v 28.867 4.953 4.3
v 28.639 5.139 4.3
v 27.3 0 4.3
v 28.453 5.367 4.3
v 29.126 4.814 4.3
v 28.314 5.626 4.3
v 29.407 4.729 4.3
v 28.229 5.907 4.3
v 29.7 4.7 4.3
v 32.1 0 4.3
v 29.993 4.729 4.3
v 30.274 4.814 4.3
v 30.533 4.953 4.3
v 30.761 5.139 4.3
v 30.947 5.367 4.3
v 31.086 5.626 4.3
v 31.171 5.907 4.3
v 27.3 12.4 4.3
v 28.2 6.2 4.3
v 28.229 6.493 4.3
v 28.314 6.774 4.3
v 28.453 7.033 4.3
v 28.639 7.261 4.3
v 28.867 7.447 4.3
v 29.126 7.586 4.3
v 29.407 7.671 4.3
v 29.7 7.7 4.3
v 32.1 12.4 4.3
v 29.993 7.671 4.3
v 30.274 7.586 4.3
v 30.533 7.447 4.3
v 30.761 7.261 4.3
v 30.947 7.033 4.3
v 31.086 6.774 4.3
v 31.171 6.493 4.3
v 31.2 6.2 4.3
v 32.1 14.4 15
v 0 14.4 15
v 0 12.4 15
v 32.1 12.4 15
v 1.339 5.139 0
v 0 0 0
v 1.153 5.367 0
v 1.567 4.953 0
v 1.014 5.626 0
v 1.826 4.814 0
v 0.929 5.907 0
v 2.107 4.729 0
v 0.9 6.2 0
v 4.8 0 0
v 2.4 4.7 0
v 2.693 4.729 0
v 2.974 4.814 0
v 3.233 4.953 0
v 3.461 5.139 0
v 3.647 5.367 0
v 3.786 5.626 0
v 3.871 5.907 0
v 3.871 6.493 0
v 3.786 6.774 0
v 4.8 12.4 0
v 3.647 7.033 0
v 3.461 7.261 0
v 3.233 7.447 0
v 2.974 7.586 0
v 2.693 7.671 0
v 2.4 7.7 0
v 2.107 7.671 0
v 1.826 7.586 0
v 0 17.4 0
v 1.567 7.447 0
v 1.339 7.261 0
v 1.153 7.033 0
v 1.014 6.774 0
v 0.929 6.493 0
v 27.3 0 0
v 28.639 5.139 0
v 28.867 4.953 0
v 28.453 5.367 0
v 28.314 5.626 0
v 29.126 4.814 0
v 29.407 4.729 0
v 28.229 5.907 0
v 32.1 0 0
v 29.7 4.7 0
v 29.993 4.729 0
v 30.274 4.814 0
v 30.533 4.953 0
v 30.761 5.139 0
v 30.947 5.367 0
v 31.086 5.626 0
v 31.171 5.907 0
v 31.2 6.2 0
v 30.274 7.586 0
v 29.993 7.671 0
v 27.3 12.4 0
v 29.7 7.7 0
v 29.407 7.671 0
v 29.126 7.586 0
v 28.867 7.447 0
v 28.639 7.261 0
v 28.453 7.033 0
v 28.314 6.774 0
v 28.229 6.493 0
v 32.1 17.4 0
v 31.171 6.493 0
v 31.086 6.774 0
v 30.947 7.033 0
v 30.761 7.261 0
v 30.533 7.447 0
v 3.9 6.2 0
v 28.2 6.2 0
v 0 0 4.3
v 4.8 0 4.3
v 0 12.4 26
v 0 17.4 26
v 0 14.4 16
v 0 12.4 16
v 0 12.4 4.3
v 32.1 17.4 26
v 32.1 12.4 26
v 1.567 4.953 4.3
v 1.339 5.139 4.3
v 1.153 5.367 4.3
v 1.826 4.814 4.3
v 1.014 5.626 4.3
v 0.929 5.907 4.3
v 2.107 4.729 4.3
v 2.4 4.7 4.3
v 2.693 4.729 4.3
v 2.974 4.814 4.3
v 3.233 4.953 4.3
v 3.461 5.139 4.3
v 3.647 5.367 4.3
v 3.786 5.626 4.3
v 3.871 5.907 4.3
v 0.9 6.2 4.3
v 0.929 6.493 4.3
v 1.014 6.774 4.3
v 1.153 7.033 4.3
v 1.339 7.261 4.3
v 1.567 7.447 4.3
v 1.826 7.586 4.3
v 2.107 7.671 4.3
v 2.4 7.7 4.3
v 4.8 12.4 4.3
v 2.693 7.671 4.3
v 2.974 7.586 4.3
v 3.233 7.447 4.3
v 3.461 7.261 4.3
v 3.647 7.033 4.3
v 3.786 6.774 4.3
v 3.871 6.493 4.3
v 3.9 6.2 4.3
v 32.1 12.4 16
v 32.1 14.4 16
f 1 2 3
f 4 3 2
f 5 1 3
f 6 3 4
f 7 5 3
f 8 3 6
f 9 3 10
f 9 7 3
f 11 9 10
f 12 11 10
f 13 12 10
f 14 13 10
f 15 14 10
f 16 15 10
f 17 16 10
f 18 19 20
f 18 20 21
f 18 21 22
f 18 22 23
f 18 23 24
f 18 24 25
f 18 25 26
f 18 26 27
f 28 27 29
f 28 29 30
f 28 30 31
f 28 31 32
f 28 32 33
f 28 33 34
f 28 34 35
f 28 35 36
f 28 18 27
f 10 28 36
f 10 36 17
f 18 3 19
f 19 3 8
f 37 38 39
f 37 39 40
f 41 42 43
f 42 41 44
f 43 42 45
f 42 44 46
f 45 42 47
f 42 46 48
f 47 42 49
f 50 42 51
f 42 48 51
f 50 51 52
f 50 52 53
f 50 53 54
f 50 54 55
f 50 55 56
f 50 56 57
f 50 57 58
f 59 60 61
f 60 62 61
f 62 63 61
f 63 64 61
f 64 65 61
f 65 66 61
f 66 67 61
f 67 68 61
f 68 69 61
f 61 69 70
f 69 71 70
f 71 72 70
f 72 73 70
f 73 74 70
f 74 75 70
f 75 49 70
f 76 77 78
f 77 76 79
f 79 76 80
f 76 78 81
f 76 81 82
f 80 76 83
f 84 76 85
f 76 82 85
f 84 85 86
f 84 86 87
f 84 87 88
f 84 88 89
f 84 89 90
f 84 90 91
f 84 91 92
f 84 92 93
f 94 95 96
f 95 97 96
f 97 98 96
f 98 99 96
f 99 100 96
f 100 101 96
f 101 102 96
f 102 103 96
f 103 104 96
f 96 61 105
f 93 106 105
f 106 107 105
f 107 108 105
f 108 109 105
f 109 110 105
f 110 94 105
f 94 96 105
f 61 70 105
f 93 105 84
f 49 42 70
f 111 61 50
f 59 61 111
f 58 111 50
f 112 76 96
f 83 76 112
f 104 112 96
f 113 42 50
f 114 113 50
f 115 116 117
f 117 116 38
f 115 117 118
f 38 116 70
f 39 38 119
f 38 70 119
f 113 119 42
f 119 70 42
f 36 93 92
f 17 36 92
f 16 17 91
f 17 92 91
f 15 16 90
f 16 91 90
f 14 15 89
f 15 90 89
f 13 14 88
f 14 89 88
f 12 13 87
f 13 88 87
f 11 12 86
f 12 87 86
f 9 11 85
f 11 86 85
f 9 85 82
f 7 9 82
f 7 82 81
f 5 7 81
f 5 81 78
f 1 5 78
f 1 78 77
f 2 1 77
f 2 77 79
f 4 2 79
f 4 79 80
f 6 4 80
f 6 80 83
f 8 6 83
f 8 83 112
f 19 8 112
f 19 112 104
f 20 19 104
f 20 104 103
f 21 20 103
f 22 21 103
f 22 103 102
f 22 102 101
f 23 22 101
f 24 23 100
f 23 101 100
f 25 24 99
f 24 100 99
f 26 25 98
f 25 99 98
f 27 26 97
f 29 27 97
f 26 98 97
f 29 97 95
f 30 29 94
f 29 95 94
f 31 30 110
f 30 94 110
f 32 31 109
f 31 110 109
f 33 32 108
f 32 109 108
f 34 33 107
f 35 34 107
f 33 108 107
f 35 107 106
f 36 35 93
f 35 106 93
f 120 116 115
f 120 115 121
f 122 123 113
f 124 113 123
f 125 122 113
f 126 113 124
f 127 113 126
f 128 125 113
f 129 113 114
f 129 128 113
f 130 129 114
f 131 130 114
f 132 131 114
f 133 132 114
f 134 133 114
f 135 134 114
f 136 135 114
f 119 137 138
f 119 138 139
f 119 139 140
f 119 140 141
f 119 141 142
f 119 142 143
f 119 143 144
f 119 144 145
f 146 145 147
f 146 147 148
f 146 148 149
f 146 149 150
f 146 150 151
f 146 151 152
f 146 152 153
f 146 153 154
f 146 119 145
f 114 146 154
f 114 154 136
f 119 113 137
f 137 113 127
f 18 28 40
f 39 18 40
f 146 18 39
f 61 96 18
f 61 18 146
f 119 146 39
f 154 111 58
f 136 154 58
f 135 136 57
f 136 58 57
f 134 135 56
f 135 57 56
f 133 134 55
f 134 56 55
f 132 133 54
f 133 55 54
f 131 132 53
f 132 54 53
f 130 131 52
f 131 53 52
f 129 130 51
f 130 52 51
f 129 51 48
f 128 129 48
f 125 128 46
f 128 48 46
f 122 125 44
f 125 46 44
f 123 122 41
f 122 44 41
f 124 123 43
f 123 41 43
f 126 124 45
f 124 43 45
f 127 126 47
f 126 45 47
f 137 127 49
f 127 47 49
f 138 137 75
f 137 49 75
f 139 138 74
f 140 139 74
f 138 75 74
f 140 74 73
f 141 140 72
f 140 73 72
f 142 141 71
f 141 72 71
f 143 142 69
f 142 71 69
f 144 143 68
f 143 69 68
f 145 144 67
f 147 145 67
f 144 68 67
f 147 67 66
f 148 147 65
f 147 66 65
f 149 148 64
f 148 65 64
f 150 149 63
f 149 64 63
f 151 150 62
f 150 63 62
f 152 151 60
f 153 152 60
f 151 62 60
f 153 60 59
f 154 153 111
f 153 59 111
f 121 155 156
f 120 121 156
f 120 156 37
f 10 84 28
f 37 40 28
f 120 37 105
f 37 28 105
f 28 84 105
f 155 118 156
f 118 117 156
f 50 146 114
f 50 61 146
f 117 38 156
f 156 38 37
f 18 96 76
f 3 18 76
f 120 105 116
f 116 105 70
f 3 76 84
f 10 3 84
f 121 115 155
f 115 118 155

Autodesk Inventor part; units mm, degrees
ref_plane "YZ Plane" through (0, 0, 0) normal (1, 0, 0) x (0, 1, 0)
ref_plane "XZ Plane" through (0, 0, 0) normal (0, 1, 0) x (-1, 0, 0)
ref_plane "XY Plane" through (0, 0, 0) normal (0, 0, 1) x (1, 0, 0)
sketch "草圖1" plane through (0, 0, 0) normal (0, 0, 1) x (1, 0, 0)
  line L0 (0, 0) -> (32.1, 0)
  line L1 (32.1, 0) -> (32.1, 12.4)
  line L2 (32.1, 12.4) -> (0, 12.4)
  line L3 (0, 12.4) -> (0, 0)
  line L4 (4.8, 12.4) -> (4.8, 0)
  line L5 (27.3, 12.4) -> (27.3, 0)
  line L6 (32.1, 12.4) -> (0, 12.4)
  line L7 (0, 12.4) -> (0, 17.4)
  line L8 (0, 17.4) -> (32.1, 17.4)
  line L9 (32.1, 17.4) -> (32.1, 12.4)
  circle A0 centre (2.4, 6.2) radius 1.5
  circle A1 centre (29.7, 6.2) radius 1.5
  point P0 (0, 12.4)
  dimension "d0" = 12.4
  dimension "d1" = 32.1
  dimension "d2" = 4.8
  dimension "d3" = 4.8
  dimension "d6" = 5
  dimension "d7" = 32.1
  dimension "d14" = 6.2
  dimension "d15" = 6.2
  dimension "d16" = 2.4
  dimension "d17" = 2.4
  dimension "d18" = 3
  dimension "d19" = 3
extrude "擠出1" add sketch "草圖1" along normal blind 4.3 contours L3 L2 L4 L0 | L5 L2 L1 L0 | A0 | A1
extrude "擠出2" add sketch "草圖1" along normal blind 15 contours L7 L8 L9 L2
sketch "草圖2" plane through (0, 0, 15) normal (0, 0, 1) x (1, 0, 0)
  line L0 (32.1, 17.4) -> (0, 17.4) projected
  line L1 (0, 17.4) -> (0, 12.4) projected
  line L2 (0, 12.4) -> (32.1, 12.4) projected
  line L3 (32.1, 12.4) -> (32.1, 17.4) projected
  line L4 (0, 17.4) -> (32.1, 17.4)
  line L5 (32.1, 17.4) -> (32.1, 14.9)
  line L6 (0, 11.4) -> (0, 17.4)
  line L7 (0, 14.4) -> (32.1, 14.4)
  point P0 (0, 0)
  dimension "d22" = 2
extrude "擠出3" add sketch "草圖2" along normal blind 1 contours L3 L7 L1 L0
sketch "草圖3" plane through (0, 0, 16) normal (0, 0, 1) x (1, 0, 0)
  line L0 (32.1, 14.4) -> (32.1, 17.4) projected
  line L1 (32.1, 17.4) -> (0, 17.4) projected
  line L2 (0, 17.4) -> (0, 14.4) projected
  line L3 (0, 14.4) -> (0, 12.4) projected
  line L4 (0, 12.4) -> (32.1, 12.4) projected
  line L5 (32.1, 12.4) -> (32.1, 14.4) projected
  line L6 (0, 12.4) -> (32.1, 12.4)
  line L7 (32.1, 12.4) -> (32.1, 17.4)
  line L8 (32.1, 17.4) -> (0, 17.4)
  line L9 (0, 17.4) -> (0, 12.4)
  line L10 (32.1, 14.4) -> (0, 14.4) projected
  line L11 (0, 14.4) -> (32.1, 14.4) projected
  point P0 (0, 0)
extrude "擠出4" add sketch "草圖3" along normal blind 10
extrude "擠出5" cut sketch "草圖1" along normal through all contours A0 | A1
properties part number "固定塊"
